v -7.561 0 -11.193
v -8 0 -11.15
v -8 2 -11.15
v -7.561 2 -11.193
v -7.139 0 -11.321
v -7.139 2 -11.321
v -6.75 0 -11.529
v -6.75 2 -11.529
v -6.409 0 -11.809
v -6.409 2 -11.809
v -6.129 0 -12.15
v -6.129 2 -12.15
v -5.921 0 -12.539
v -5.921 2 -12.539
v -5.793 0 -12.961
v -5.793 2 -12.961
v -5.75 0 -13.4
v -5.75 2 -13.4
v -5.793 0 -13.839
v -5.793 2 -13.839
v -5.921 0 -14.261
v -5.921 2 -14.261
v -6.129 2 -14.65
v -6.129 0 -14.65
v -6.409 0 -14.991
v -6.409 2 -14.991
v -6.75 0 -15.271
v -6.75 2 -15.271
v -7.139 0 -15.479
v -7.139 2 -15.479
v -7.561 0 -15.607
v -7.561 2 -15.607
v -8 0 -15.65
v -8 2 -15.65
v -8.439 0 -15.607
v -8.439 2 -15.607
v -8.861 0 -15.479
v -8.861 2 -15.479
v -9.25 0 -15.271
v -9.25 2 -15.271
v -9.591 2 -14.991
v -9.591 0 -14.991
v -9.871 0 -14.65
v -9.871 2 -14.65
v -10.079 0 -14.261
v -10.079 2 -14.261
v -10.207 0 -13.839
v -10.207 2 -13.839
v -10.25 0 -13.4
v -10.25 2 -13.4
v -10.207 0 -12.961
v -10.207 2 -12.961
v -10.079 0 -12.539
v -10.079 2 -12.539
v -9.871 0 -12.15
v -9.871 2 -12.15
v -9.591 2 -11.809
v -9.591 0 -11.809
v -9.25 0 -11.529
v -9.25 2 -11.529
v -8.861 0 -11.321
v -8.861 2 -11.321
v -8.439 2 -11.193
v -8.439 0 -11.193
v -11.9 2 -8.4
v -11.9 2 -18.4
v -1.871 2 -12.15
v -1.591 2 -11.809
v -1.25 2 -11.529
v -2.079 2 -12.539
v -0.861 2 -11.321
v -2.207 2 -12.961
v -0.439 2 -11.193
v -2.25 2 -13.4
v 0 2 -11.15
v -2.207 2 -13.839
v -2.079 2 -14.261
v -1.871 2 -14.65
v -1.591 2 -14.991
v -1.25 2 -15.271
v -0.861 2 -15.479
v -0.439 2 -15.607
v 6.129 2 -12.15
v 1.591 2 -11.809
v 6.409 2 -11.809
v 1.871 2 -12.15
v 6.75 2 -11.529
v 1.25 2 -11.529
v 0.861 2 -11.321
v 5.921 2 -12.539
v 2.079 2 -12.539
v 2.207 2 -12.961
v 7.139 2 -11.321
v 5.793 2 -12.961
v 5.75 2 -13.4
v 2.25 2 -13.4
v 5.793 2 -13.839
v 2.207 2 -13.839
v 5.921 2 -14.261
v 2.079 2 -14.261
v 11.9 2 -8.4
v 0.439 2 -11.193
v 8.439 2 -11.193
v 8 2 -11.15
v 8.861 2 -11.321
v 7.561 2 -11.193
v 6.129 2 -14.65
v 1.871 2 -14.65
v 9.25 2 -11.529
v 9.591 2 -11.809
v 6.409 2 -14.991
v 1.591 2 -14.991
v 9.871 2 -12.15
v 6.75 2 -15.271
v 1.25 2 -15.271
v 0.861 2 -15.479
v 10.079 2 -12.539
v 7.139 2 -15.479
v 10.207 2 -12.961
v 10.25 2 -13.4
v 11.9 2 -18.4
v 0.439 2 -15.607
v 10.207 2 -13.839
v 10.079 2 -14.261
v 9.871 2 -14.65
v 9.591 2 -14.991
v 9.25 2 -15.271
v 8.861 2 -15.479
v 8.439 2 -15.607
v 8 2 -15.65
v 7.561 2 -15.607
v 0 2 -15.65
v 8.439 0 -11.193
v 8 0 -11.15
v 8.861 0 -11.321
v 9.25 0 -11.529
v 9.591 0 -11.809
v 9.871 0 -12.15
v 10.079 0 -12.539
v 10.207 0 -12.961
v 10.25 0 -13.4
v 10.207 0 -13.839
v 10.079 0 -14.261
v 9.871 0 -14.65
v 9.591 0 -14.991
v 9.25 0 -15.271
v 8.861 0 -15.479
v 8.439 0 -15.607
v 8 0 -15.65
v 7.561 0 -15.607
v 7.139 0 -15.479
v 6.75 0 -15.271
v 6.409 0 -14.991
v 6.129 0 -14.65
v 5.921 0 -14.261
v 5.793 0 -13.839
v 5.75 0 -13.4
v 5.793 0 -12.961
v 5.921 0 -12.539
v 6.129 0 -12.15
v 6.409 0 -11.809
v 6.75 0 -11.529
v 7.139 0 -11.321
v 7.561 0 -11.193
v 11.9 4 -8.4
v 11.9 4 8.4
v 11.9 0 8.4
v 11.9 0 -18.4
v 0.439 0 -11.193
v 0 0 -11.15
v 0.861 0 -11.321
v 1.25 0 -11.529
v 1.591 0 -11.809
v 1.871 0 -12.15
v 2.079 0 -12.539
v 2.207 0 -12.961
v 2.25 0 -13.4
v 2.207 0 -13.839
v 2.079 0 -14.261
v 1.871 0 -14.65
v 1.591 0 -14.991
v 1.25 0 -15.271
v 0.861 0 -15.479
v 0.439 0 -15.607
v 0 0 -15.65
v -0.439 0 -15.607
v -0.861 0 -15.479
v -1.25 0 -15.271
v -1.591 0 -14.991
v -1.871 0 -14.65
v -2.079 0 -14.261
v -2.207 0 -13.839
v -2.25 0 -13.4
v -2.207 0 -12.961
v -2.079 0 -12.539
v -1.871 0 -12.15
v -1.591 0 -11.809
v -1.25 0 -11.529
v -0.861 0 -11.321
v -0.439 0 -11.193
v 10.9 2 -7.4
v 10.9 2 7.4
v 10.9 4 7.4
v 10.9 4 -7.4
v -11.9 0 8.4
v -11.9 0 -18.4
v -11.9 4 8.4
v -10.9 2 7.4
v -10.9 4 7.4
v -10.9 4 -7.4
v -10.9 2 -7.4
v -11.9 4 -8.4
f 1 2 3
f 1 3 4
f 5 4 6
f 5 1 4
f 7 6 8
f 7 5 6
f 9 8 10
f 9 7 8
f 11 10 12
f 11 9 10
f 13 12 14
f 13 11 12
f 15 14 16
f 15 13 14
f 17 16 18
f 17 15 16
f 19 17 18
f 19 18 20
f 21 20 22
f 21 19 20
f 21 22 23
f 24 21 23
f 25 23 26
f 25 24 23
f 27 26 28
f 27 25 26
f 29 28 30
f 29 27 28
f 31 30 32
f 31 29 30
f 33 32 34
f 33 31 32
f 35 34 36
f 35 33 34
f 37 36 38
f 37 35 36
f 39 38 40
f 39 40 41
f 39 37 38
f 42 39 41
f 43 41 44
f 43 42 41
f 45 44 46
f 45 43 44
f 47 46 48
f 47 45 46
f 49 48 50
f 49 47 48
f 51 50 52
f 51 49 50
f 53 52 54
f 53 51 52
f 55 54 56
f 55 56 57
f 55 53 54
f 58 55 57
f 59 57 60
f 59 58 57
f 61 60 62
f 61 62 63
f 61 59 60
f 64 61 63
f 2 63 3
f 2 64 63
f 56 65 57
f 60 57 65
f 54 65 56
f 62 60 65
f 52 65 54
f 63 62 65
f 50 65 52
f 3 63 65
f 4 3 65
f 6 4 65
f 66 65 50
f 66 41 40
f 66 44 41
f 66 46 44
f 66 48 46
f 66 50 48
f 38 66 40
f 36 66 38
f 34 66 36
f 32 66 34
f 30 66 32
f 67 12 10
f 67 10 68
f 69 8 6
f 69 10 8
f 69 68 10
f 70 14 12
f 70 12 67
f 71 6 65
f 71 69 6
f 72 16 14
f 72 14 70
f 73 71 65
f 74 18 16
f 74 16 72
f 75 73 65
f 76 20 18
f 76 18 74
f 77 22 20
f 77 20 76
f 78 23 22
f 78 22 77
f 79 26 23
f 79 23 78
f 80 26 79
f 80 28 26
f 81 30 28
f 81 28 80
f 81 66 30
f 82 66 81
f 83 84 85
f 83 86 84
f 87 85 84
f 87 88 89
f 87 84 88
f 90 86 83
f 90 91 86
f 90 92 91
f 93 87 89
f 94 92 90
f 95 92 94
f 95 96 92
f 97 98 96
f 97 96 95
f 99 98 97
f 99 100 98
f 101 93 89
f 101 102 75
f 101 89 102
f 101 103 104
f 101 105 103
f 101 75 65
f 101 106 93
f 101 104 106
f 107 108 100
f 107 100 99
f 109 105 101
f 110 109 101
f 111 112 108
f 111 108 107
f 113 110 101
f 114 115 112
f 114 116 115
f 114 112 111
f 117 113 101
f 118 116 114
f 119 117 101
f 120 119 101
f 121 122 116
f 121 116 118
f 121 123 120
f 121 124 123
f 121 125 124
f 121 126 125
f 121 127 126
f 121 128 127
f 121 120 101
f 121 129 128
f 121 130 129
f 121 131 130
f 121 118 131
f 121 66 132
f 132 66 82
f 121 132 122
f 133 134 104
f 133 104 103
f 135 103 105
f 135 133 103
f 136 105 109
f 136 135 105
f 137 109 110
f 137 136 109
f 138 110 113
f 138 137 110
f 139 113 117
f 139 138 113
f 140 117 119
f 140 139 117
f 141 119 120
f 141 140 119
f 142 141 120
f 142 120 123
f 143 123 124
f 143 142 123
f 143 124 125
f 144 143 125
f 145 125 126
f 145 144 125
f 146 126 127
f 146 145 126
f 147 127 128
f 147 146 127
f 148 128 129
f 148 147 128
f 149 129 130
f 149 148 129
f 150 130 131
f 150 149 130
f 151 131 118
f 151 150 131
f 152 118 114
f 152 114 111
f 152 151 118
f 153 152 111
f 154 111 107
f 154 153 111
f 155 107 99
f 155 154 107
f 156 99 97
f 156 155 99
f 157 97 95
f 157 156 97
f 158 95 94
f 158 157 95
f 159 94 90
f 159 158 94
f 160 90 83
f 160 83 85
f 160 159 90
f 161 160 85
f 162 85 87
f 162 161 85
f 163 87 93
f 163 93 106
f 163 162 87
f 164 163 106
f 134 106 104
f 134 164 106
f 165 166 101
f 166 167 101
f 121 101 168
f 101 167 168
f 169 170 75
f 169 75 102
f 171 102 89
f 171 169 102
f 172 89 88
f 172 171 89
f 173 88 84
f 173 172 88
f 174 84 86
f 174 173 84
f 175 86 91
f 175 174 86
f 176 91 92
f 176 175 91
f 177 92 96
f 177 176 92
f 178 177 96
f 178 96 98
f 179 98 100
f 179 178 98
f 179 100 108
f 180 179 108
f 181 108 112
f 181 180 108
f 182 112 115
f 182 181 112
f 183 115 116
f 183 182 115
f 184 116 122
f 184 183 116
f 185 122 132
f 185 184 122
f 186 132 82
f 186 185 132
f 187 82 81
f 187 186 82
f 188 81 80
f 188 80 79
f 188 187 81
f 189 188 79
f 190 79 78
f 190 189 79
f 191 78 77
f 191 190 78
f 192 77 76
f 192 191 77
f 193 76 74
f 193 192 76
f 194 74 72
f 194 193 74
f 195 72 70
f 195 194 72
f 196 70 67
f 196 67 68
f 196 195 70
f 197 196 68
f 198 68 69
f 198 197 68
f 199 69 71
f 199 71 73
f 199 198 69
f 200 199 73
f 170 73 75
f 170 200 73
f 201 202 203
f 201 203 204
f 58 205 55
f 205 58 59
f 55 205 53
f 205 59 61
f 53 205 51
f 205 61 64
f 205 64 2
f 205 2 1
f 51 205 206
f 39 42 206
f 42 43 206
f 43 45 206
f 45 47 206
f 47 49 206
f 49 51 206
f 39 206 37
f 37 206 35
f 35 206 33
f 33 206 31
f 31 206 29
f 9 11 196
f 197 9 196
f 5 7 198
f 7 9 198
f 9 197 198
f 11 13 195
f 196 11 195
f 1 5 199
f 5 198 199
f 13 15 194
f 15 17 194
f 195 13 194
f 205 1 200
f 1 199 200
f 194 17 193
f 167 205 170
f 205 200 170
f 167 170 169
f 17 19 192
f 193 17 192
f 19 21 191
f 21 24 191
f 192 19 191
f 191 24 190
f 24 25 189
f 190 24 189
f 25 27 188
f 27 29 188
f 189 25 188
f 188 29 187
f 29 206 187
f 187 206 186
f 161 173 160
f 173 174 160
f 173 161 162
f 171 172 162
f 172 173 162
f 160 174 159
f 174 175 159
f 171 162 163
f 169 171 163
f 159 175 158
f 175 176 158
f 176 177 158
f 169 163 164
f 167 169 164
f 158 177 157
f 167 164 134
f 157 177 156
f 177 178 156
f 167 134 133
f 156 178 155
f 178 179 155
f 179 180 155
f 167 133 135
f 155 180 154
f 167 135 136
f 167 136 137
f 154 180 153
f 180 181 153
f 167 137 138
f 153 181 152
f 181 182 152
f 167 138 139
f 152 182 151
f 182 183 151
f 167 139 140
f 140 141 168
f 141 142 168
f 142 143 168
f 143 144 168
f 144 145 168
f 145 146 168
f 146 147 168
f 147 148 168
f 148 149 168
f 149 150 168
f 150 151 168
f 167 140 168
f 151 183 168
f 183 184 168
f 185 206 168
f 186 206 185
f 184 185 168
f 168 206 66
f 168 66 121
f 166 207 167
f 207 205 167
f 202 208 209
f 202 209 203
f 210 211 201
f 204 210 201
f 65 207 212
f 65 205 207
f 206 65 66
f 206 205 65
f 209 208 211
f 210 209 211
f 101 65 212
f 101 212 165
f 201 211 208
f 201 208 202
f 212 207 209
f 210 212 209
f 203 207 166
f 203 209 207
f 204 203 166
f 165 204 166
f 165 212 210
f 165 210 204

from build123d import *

# Parameters (mm, degrees)
SKETCH_1_W      = 23.8
SKETCH_1_H      = 10
SKETCH_1_R      = 2.25
SKETCH_1_H_2    = 16.8
SKETCH_1_W_2    = 21.8
SKETCH_1_H_3    = 14.8
EXTRUDE_1_DEPTH = 2
EXTRUDE_START   = 2
SKETCH_1_3_W    = 23.8
SKETCH_1_3_H    = 16.8
SKETCH_1_3_W_2  = 21.8
SKETCH_1_3_H_2  = 14.8
EXTRUDE_2_DEPTH = 2


with BuildPart() as part:
    # 草图1 → 凸台-拉伸1 (new body)
    # profile 1 of 3: a face of its own
    with BuildSketch(Plane(origin=(0, 0, 0), x_dir=(1, 0, 0), z_dir=(0, 1, 0))):
        with Locations((0, 13.4)):
            Rectangle(SKETCH_1_W, SKETCH_1_H)
        with Locations(Location((0, 13.4, 0), (0, 0, 270))):
            Circle(SKETCH_1_R, mode=Mode.SUBTRACT)
        with Locations(Location((-8, 13.4, 0), (0, 0, 270))):
            Circle(SKETCH_1_R, mode=Mode.SUBTRACT)
        with Locations(Location((8, 13.4, 0), (0, 0, 270))):
            Circle(SKETCH_1_R, mode=Mode.SUBTRACT)
    # profile 2 of 3: a face of its own
    with BuildSketch(Plane(origin=(0, 0, 0), x_dir=(1, 0, 0), z_dir=(0, 1, 0))):
        Rectangle(SKETCH_1_W, SKETCH_1_H_2)
        Rectangle(SKETCH_1_W_2, SKETCH_1_H_3, mode=Mode.SUBTRACT)
    # profile 3 of 3: a face of its own
    with BuildSketch(Plane(origin=(0, 0, 0), x_dir=(1, 0, 0), z_dir=(0, 1, 0))):
        Rectangle(SKETCH_1_W_2, SKETCH_1_H_3)
    extrude(amount=EXTRUDE_1_DEPTH)

    # 草图1<3> → 凸台-拉伸2 (add)
    with BuildSketch(Plane(origin=(0, 0, 0), x_dir=(1, 0, 0), z_dir=(0, 1, 0)).offset(EXTRUDE_START)):
        Rectangle(SKETCH_1_3_W, SKETCH_1_3_H)
        Rectangle(SKETCH_1_3_W_2, SKETCH_1_3_H_2, mode=Mode.SUBTRACT)
    extrude(amount=EXTRUDE_2_DEPTH)


solid = part.part
